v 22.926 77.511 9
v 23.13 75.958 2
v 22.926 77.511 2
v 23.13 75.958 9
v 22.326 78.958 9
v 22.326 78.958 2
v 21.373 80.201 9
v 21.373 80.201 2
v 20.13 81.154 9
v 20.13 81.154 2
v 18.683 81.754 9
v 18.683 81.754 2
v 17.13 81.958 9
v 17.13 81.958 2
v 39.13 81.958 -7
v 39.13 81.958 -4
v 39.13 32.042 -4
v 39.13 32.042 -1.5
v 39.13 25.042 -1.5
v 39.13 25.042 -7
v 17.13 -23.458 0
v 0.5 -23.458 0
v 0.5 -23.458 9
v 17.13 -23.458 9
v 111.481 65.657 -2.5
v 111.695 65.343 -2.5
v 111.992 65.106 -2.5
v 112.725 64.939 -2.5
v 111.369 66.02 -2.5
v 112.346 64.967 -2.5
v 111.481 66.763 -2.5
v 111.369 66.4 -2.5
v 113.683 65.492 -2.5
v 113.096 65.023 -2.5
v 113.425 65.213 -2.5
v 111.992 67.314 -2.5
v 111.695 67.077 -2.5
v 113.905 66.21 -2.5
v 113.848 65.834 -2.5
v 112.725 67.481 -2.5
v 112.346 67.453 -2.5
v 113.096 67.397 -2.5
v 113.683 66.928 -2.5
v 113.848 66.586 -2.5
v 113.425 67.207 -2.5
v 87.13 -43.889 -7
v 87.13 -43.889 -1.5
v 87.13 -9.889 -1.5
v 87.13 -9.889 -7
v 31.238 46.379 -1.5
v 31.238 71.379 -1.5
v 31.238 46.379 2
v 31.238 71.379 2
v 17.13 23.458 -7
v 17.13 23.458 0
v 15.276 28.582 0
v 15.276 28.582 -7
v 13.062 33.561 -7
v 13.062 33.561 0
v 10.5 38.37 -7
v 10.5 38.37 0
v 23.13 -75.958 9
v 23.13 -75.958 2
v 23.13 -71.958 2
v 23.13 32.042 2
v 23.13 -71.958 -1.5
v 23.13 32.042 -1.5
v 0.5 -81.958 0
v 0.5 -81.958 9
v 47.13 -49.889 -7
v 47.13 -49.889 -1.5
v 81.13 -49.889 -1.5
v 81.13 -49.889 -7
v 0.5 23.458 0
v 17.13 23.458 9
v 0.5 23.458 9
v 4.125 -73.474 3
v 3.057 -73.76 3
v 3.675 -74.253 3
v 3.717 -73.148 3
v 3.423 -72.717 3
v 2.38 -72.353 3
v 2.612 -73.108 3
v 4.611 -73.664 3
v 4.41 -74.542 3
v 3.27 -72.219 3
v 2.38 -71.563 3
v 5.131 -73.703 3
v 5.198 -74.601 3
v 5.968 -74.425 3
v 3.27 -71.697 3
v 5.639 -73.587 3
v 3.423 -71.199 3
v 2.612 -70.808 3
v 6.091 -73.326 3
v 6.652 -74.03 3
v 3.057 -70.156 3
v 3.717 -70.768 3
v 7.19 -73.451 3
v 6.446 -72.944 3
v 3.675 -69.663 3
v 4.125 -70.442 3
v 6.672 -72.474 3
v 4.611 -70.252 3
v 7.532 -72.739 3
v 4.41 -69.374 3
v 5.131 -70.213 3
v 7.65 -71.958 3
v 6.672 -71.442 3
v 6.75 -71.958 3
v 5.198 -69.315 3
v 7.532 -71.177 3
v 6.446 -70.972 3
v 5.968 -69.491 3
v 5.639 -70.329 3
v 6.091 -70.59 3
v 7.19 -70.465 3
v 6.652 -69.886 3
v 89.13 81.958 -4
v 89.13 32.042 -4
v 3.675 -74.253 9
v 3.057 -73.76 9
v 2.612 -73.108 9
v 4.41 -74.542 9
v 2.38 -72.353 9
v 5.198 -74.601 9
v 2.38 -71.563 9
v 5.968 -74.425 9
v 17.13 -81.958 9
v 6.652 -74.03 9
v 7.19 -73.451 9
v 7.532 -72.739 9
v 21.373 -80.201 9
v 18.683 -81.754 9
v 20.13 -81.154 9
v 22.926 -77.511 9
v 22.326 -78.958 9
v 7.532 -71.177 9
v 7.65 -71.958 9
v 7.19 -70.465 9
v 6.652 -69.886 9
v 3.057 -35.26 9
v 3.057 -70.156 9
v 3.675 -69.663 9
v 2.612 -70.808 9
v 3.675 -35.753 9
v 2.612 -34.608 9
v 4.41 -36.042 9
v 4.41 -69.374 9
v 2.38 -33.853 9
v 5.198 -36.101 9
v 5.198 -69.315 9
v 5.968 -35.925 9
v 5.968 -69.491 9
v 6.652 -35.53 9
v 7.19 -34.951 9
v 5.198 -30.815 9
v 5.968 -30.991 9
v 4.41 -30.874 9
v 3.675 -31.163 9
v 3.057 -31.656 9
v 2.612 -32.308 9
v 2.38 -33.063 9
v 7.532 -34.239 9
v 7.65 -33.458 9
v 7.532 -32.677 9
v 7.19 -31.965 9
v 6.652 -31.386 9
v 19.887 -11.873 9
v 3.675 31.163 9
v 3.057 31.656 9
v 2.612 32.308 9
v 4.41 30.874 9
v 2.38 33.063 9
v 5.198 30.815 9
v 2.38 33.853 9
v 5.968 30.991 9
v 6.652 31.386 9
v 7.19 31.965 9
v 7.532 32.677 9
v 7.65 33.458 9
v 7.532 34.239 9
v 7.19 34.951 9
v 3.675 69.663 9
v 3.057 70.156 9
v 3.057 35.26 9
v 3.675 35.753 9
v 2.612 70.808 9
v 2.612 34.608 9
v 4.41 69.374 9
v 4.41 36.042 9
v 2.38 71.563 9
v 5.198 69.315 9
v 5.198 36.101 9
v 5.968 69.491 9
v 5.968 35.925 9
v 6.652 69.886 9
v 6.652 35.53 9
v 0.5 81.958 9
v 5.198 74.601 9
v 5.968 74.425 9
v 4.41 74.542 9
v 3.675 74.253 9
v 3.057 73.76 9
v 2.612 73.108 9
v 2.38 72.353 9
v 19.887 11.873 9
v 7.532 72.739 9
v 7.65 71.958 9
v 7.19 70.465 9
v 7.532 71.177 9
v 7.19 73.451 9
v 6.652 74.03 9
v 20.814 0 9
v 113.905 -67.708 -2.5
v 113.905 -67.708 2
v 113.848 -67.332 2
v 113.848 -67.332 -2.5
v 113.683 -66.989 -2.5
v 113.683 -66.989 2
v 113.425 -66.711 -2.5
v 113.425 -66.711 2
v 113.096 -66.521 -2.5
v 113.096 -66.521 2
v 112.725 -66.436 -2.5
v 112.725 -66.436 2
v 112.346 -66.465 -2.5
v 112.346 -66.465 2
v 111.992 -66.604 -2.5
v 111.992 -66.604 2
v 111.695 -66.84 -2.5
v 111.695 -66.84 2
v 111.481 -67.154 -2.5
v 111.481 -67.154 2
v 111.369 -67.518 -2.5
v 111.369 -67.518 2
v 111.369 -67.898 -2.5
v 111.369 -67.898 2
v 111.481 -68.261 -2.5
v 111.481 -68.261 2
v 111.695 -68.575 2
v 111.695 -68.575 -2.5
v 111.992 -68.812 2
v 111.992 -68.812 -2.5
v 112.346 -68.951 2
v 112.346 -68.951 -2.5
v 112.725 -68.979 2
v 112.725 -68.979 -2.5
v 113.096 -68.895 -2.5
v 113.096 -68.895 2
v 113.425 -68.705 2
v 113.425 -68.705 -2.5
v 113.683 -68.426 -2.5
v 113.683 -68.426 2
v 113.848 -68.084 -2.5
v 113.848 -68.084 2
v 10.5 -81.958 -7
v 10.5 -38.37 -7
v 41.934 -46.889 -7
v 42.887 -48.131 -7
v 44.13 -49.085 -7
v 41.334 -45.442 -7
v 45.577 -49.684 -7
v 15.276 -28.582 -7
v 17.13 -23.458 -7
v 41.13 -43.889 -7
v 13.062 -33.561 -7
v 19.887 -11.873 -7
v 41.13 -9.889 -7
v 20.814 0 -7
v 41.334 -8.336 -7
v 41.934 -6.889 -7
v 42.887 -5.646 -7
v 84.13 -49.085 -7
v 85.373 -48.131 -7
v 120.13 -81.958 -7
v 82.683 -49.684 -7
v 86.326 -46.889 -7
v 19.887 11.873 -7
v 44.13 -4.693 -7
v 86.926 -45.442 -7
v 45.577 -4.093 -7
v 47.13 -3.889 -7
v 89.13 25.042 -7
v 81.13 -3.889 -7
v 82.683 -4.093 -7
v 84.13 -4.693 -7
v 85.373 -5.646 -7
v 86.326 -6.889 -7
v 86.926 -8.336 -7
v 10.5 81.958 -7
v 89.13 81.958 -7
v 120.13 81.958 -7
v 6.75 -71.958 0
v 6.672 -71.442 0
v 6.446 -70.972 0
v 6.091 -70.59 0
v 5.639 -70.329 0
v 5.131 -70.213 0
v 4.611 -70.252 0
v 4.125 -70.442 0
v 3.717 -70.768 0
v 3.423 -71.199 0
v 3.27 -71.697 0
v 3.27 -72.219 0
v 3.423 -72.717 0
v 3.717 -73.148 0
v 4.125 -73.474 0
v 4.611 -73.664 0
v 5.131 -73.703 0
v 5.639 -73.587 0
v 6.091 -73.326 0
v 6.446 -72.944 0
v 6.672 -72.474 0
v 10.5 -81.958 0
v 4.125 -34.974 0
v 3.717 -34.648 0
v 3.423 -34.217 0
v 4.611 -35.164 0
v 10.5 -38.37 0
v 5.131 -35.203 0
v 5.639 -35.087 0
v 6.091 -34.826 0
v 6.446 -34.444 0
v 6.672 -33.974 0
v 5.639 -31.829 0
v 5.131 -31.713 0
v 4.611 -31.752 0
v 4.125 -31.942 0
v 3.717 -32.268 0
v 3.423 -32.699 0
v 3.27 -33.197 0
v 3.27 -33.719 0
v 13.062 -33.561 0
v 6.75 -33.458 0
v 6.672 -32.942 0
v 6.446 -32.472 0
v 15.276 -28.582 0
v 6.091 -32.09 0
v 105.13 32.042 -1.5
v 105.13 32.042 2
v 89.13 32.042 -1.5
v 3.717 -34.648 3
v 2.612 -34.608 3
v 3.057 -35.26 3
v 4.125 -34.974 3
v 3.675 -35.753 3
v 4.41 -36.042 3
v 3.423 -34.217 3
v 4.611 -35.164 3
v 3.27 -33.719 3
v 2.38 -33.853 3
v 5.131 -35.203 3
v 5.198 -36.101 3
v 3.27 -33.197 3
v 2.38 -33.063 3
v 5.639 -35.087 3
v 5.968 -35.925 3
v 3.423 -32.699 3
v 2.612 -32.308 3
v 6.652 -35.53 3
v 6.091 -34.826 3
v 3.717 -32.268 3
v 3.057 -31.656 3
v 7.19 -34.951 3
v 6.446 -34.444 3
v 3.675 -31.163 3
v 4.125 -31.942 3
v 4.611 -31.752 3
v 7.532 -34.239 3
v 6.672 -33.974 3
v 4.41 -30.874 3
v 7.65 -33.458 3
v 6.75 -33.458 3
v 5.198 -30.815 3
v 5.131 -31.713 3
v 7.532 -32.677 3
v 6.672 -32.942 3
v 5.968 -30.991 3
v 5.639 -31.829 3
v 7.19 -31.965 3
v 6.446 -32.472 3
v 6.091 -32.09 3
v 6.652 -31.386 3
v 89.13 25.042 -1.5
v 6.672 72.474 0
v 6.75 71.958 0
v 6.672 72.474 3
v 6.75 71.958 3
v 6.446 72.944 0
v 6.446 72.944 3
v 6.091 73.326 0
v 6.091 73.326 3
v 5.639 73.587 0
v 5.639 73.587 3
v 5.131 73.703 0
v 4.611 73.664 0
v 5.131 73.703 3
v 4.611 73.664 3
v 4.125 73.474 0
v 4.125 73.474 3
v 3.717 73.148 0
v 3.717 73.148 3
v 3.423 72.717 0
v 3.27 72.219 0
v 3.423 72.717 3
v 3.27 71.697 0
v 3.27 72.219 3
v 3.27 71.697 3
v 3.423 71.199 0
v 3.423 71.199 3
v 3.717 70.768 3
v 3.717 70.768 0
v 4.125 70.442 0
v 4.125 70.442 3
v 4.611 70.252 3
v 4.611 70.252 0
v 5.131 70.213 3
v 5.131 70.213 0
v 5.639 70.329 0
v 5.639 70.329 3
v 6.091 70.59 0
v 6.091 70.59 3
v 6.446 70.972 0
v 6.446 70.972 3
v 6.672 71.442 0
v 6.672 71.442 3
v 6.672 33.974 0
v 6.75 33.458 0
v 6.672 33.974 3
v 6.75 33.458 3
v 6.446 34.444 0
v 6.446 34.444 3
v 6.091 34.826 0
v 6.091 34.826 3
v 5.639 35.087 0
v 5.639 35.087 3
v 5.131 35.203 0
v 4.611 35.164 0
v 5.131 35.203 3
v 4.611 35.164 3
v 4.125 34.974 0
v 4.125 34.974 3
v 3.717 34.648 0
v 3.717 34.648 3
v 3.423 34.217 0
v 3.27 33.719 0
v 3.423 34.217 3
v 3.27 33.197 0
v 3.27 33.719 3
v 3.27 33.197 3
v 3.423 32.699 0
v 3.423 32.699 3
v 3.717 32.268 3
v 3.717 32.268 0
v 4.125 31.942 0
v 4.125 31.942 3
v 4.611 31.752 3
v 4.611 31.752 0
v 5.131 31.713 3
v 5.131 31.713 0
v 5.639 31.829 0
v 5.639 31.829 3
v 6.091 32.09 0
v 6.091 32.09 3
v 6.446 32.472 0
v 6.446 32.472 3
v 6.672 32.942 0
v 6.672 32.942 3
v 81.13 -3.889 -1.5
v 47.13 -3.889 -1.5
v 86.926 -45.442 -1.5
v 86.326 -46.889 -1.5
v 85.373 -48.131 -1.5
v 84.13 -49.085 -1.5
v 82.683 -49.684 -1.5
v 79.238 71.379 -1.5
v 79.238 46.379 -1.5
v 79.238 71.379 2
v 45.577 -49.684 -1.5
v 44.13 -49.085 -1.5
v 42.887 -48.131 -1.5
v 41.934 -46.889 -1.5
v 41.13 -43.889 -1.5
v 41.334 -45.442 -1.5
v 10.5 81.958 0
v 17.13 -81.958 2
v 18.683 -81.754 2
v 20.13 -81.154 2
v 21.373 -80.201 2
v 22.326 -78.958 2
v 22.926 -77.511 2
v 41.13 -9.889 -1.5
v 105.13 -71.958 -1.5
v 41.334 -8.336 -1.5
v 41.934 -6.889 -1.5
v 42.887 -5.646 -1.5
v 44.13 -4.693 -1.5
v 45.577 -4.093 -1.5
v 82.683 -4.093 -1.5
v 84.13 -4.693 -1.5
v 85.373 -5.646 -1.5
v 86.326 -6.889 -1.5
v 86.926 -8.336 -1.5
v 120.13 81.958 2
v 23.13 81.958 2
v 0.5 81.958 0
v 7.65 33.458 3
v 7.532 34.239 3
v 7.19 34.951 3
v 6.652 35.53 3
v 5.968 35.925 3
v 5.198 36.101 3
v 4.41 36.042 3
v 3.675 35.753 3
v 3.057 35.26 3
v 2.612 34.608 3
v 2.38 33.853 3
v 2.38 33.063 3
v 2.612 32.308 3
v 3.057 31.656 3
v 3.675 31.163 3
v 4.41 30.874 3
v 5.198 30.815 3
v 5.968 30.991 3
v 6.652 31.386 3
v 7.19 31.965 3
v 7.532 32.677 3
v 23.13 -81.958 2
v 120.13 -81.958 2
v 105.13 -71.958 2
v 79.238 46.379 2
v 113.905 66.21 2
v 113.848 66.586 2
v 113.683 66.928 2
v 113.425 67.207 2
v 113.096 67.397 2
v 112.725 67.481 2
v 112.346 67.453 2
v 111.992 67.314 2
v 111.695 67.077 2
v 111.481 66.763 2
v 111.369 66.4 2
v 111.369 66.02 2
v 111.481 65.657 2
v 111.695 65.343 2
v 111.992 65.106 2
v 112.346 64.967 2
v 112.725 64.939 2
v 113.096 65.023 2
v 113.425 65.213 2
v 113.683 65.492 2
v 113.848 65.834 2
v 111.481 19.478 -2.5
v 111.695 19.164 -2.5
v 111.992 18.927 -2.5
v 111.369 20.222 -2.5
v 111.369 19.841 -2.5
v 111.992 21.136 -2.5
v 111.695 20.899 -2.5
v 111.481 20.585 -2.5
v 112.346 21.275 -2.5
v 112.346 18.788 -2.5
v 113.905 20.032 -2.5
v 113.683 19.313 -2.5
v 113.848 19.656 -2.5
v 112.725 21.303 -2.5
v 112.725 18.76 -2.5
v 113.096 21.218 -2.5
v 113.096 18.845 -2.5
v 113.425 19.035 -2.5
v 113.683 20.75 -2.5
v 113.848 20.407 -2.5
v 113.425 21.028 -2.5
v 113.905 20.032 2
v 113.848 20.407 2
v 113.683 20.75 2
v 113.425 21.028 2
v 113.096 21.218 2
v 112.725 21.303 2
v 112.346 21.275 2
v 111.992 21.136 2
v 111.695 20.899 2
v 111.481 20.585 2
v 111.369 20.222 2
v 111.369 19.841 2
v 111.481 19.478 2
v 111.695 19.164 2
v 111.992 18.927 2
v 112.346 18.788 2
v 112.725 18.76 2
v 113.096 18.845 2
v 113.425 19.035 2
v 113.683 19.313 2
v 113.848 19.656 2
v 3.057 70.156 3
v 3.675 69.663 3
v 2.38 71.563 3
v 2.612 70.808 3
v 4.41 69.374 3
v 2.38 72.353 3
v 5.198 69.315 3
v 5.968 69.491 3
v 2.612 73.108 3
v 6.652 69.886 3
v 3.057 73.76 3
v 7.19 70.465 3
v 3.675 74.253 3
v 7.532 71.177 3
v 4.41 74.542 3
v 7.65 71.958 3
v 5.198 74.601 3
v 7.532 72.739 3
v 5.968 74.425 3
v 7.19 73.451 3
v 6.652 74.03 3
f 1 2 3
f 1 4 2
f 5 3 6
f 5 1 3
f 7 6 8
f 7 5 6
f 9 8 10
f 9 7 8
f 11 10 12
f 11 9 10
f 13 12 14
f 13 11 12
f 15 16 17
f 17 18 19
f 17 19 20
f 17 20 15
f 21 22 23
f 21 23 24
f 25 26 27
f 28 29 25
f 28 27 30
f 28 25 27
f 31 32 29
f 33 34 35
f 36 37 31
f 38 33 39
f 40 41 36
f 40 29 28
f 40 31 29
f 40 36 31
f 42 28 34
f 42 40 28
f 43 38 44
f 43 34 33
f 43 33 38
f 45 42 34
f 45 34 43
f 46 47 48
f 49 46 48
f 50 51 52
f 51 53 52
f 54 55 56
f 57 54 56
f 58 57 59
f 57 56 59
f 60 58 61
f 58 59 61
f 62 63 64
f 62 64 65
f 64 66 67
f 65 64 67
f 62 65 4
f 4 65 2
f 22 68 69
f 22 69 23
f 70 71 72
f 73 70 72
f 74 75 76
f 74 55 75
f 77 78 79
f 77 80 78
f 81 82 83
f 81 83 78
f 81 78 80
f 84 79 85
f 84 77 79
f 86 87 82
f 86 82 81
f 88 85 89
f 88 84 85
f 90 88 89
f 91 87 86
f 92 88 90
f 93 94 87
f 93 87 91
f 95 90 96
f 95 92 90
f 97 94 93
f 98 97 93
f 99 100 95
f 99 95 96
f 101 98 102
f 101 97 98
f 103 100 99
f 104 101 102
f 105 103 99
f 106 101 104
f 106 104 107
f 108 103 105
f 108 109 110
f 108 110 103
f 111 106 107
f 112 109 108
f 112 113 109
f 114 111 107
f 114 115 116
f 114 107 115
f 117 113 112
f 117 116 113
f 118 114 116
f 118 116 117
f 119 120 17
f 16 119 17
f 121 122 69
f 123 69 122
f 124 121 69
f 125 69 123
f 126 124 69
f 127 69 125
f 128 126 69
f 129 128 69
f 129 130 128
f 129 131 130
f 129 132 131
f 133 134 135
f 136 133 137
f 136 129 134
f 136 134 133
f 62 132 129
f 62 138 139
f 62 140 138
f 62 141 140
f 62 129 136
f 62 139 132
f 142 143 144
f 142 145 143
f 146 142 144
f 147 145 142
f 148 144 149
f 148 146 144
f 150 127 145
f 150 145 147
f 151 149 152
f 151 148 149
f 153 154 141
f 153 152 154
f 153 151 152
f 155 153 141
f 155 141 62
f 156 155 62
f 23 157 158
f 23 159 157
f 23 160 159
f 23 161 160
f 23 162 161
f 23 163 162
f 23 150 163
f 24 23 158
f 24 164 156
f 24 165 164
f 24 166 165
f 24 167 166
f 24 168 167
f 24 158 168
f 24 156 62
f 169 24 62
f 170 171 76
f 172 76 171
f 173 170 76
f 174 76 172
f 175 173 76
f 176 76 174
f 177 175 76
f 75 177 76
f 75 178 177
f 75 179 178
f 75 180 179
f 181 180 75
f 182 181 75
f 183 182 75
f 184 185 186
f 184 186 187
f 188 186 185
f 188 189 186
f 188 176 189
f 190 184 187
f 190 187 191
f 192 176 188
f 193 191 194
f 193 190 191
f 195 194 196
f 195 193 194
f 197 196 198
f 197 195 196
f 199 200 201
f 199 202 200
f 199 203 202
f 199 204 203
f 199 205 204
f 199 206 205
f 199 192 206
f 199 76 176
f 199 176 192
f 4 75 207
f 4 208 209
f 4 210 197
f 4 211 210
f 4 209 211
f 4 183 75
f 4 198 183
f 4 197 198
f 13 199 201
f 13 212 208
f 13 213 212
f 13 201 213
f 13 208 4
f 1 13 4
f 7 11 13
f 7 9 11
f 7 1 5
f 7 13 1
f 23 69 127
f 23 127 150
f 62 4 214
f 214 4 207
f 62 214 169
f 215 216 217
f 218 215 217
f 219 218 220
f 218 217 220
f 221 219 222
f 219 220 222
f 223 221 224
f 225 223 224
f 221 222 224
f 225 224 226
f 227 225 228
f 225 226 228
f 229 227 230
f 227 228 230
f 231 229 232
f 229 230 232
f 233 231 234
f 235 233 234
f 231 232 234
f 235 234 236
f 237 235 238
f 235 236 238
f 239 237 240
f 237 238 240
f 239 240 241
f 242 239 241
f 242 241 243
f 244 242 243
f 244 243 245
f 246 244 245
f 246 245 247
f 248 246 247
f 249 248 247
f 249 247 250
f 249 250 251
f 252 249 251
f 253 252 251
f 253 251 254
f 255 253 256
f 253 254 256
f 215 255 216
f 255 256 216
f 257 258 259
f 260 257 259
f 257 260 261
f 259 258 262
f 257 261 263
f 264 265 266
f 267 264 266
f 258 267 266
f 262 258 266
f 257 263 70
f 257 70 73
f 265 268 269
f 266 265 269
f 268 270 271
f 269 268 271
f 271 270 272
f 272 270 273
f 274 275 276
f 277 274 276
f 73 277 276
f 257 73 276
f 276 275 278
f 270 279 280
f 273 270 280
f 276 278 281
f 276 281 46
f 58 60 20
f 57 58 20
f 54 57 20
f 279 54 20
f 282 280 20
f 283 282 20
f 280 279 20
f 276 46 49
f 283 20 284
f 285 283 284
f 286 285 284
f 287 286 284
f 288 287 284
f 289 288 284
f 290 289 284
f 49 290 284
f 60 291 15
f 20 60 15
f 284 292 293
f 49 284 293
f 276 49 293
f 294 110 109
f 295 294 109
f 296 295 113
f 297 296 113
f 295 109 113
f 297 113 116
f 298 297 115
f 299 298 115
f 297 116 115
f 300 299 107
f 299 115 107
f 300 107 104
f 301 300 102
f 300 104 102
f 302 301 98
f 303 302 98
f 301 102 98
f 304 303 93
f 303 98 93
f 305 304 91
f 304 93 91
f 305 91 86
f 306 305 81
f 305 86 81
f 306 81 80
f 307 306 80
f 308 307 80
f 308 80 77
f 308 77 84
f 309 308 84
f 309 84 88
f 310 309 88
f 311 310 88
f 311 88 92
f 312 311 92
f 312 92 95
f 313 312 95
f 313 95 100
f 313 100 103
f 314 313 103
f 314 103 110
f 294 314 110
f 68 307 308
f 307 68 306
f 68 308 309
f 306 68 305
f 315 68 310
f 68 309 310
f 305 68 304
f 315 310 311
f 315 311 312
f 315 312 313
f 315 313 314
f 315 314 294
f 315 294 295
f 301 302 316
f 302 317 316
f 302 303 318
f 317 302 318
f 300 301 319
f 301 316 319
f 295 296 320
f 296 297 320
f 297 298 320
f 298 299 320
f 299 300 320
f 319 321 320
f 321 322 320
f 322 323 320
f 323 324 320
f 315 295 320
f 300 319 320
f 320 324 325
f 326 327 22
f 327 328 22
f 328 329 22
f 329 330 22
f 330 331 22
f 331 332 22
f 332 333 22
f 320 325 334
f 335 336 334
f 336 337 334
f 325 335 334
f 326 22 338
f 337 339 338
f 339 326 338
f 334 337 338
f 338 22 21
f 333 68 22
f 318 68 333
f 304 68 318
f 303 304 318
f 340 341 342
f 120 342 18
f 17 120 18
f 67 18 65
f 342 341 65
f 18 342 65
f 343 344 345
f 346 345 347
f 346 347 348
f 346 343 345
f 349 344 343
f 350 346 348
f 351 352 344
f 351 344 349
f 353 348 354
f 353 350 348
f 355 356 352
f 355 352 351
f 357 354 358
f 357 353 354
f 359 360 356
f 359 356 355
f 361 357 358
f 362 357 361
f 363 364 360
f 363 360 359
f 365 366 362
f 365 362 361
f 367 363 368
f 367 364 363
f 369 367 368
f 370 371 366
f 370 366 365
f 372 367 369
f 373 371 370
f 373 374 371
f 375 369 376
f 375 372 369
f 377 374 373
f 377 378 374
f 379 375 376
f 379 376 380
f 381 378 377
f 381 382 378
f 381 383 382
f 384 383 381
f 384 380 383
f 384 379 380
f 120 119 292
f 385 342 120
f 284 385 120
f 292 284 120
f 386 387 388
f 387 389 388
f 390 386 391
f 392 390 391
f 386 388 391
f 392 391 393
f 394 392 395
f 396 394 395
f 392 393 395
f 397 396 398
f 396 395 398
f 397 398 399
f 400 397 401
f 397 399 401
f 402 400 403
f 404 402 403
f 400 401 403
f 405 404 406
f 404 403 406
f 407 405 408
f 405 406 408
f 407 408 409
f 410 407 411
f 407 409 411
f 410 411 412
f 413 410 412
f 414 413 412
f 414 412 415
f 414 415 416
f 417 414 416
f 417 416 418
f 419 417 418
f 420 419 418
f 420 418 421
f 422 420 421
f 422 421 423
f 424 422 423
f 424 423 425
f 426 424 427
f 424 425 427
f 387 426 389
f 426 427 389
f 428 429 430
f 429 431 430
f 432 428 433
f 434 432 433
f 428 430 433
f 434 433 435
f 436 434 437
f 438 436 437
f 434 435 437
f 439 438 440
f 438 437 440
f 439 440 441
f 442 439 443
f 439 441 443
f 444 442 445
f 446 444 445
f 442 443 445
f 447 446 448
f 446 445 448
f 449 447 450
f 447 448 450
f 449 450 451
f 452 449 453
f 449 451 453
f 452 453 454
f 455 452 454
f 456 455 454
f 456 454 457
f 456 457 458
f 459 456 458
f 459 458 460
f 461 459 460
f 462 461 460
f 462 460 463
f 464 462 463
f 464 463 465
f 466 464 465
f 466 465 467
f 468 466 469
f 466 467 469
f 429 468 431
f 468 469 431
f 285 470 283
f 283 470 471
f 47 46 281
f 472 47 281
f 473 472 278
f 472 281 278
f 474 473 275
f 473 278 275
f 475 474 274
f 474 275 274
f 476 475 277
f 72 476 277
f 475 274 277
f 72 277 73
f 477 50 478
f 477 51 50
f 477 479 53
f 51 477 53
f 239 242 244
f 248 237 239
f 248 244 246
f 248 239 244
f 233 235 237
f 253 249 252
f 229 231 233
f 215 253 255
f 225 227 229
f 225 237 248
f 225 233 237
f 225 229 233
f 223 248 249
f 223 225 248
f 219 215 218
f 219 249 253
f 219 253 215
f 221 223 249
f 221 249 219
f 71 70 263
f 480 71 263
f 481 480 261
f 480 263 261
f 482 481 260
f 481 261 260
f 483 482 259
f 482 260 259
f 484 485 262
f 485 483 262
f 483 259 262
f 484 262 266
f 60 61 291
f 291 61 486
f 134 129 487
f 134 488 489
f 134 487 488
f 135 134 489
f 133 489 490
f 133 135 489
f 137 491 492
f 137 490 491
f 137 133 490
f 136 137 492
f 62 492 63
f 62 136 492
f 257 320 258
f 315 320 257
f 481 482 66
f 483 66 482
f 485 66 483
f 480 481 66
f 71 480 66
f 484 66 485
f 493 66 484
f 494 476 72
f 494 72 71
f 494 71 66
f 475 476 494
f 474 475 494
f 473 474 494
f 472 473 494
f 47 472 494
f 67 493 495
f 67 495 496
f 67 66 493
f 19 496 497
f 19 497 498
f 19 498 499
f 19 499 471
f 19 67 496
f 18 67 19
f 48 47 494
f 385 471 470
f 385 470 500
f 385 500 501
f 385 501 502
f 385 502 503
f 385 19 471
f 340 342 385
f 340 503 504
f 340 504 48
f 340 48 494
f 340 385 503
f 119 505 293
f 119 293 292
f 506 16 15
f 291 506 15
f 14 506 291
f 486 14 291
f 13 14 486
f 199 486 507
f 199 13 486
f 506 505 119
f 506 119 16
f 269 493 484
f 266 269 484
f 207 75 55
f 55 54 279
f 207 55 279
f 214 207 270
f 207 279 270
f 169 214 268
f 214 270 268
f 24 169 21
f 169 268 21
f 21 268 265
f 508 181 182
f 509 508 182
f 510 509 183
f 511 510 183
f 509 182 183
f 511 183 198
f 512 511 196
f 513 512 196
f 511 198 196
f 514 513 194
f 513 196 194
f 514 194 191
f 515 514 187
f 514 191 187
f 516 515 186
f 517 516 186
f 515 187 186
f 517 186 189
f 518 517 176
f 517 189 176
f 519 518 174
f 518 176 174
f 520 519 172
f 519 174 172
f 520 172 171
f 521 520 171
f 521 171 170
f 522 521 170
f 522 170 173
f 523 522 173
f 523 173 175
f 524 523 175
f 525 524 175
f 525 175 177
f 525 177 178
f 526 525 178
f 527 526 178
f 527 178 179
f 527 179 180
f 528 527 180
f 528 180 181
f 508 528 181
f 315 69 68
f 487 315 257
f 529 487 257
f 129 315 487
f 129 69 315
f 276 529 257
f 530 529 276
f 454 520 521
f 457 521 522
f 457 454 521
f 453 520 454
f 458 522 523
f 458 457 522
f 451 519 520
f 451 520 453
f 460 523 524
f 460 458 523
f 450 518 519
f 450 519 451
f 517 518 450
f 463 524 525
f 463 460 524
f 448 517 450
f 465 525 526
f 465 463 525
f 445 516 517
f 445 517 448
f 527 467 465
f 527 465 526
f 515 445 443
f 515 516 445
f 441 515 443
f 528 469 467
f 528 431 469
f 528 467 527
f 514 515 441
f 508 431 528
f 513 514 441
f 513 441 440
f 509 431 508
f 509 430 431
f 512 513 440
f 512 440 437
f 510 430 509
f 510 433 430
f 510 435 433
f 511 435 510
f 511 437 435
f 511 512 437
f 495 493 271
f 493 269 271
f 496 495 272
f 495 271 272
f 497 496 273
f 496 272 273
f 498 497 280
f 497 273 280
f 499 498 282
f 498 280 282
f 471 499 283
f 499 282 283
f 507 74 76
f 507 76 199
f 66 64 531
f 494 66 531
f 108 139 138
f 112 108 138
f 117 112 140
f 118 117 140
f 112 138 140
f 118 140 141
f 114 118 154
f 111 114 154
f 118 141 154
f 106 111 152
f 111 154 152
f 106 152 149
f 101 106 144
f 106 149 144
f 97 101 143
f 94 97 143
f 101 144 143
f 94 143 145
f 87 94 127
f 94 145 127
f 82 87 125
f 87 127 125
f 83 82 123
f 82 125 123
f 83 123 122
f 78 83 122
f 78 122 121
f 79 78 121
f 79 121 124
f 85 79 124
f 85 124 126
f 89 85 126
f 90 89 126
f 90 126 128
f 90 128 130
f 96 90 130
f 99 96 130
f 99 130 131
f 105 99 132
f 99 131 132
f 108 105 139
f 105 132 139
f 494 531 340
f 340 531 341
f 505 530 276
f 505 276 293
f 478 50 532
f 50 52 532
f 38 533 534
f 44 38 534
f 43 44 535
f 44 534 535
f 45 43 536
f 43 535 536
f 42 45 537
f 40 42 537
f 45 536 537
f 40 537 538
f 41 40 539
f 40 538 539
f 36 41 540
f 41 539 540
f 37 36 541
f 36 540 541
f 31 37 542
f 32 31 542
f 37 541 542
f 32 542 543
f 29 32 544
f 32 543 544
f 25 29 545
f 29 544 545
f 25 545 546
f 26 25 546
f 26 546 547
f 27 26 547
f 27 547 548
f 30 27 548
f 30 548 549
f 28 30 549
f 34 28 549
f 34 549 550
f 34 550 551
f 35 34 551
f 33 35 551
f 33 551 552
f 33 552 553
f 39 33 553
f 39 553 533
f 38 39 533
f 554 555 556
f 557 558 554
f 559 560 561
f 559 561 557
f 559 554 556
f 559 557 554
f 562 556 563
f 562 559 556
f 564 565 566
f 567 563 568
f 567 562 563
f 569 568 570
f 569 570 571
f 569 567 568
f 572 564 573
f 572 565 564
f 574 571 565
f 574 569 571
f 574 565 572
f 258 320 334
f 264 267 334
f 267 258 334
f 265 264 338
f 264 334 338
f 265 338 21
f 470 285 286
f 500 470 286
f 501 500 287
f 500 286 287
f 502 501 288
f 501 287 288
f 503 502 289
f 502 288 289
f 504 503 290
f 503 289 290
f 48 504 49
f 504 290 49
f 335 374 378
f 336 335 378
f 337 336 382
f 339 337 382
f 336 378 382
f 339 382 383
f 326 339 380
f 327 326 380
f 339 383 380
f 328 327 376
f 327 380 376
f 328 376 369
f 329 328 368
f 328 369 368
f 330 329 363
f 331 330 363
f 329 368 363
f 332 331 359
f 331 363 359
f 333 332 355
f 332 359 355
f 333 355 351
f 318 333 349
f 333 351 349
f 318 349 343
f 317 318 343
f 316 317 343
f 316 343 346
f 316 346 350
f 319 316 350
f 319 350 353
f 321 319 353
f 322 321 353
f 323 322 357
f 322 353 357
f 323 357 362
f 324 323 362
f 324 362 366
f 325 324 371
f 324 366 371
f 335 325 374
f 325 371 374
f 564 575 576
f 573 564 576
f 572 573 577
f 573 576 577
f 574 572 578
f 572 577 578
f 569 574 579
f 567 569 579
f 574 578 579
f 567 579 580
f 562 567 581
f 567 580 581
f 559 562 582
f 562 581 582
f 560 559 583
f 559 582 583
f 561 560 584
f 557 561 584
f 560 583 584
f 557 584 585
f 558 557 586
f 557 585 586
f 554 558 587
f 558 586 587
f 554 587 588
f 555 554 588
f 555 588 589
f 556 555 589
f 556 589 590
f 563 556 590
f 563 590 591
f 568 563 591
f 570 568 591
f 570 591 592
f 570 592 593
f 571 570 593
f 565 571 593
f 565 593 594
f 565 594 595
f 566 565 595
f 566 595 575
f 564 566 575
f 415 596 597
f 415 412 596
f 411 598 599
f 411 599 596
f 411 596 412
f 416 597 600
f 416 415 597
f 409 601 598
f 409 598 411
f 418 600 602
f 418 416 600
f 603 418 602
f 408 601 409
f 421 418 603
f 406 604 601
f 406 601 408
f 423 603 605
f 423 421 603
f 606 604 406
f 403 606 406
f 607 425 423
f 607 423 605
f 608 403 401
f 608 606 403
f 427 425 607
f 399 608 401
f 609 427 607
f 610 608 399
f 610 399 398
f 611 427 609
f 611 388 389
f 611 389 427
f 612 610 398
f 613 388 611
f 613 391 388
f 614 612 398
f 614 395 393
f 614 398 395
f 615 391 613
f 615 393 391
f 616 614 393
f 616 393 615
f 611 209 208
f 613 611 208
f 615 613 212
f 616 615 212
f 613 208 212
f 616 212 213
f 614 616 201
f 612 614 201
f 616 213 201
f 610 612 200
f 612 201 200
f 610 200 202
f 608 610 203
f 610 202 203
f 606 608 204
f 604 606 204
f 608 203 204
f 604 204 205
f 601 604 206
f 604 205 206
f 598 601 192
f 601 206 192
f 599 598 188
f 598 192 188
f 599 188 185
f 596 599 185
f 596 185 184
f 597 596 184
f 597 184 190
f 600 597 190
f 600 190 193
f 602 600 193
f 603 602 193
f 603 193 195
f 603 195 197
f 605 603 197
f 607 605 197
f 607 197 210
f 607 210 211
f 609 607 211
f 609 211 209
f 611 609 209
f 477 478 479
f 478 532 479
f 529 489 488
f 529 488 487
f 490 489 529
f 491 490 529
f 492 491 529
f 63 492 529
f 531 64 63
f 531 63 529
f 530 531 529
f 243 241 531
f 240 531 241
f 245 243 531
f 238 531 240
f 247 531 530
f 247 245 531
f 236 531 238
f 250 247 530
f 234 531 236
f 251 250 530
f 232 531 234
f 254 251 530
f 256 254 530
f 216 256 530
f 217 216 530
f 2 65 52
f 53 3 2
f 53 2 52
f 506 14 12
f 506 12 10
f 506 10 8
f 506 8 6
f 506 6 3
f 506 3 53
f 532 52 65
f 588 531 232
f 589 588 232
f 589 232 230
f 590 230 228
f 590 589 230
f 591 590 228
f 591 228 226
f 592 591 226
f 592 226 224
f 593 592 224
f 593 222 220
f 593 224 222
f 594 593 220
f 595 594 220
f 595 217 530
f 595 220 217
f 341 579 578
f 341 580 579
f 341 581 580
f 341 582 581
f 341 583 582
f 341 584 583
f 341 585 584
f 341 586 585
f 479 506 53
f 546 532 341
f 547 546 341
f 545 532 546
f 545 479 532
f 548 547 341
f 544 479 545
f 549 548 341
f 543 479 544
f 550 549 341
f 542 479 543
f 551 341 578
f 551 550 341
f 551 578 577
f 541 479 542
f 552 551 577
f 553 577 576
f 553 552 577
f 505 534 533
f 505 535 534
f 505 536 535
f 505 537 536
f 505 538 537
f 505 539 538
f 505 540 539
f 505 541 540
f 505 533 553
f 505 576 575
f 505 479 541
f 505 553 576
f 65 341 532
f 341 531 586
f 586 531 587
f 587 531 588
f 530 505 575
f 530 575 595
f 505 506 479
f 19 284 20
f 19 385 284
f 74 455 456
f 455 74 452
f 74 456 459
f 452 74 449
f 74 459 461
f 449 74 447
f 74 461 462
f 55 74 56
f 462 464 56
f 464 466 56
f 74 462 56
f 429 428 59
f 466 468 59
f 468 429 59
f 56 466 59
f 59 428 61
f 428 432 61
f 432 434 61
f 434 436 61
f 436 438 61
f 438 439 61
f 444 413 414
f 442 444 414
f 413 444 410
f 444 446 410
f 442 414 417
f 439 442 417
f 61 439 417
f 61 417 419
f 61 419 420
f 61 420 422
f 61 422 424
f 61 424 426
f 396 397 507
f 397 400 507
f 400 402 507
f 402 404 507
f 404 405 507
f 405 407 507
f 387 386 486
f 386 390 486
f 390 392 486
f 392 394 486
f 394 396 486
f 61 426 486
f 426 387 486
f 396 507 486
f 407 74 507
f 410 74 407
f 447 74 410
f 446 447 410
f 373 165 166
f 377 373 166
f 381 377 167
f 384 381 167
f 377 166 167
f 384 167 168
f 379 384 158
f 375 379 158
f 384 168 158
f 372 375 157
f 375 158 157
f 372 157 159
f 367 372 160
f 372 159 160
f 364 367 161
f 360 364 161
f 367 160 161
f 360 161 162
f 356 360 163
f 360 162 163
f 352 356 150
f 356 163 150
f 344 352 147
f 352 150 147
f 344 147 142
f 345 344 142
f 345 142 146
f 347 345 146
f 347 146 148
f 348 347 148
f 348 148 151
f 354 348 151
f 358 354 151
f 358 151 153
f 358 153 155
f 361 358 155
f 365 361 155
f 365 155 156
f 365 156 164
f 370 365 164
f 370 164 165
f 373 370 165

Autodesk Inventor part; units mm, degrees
ref_plane "YZ Plane" through (0, 0, 0) normal (1, 0, 0) x (0, 1, 0)
ref_plane "XZ Plane" through (0, 0, 0) normal (0, 1, 0) x (-1, 0, 0)
ref_plane "XY Plane" through (0, 0, 0) normal (0, 0, 1) x (1, 0, 0)
sketch "Sketch1" plane through (0, 0, 0) normal (0, 0, 1) x (1, 0, 0)
  line L0 (0, 0) -> (0, 22.958) construction
  line L1 (0, 0) -> (0, -22.958) construction
  line L2 (0, -22.958) -> (16.63, -22.958) construction
  line L3 (16.63, -22.958) -> (16.63, -81.958) construction
  line L4 (16.63, -81.958) -> (0, -81.958) construction
  line L5 (0, -81.958) -> (0, -22.958) construction
  line L6 (0, 22.958) -> (16.63, 22.958) construction
  line L7 (16.63, 22.958) -> (16.63, 81.958) construction
  line L8 (16.63, 81.958) -> (0, 81.958) construction
  line L9 (0, 81.958) -> (0, 22.958) construction
  line L10 (0, -52.458) -> (0.5, -52.458) construction
  line L11 (8.315, -22.958) -> (8.315, -23.458) construction
  line L12 (0, 0) -> (-53.686, 0) construction
  circle A0 centre (-53.686, 0) radius 74 construction
  line L13 (20.314, 0) -> (20.814, 0) construction
  line L14 (16.63, -22.958) -> (17.13, -22.958) construction
  line L15 (16.63, 22.958) -> (17.13, 22.958) construction
  line L16 (0.5, -23.458) -> (17.13, -23.458)
  line L17 (17.13, -23.458) -> (17.13, -81.958)
  line L18 (17.13, -81.958) -> (0.5, -81.958)
  line L19 (0.5, -81.958) -> (0.5, -23.458)
  line L20 (8.315, 22.958) -> (8.315, 23.458) construction
  line L21 (0.5, 81.958) -> (17.13, 81.958)
  line L22 (17.13, 81.958) -> (17.13, 23.458)
  line L23 (17.13, 23.458) -> (0.5, 23.458)
  line L24 (0.5, 23.458) -> (0.5, 81.958)
  arc A1 (17.13, -23.458) -> (17.13, 23.458) centre (-55.7128, 0) ccw
  line L25 (17.13, -81.958) -> (23.13, -81.958)
  line L26 (23.13, -81.958) -> (23.13, 81.958)
  line L27 (23.13, 81.958) -> (17.13, 81.958)
  dimension "d8" = 148
  dimension "d0" = 22.958
  dimension "d1" = 22.958
  dimension "d2" = 16.63
  dimension "d3" = 59
  dimension "d5" = 0.5
  dimension "d6" = 0.5
  dimension "d7" = 53.686
  dimension "d9" = 0.5
  dimension "d10" = 0.5
  dimension "d11" = 0.5
  dimension "d13" = 0.5
  dimension "d14" = 6
extrude "Extrusion1" add sketch "Sketch1" along normal blind 9
sketch "Sketch2" plane through (0, 0, 0) normal (0, 0, -1) x (-1, 0, 0)
  line L0 (-16.63, 22.958) -> (-16.63, 81.958) construction
  circle A0 centre (53.686, 0) radius 74 construction
  line L1 (-16.63, -22.958) -> (-16.63, -81.958) construction
  line L2 (-0.5, 23.458) -> (-17.13, 23.458) projected
  line L3 (-16.63, 23.458) -> (-16.63, 81.958)
  line L4 (-23.13, 81.958) -> (-0.5, 81.958) projected
  line L5 (-17.13, -23.458) -> (-0.5, -23.458) projected
  line L6 (-16.63, -23.458) -> (-16.63, -81.958)
  line L7 (-0.5, -81.958) -> (-23.13, -81.958) projected
  arc A1 (-17.13, 23.458) -> (-17.13, -23.458) centre (55.7128, 0) ccw projected
  arc A2 (-17.13, 23.458) -> (-17.13, -23.458) centre (55.7128, 0) ccw
  line L8 (-23.13, 81.958) -> (-110.13, 81.958)
  line L9 (-110.13, 81.958) -> (-110.13, -81.958)
  line L10 (-110.13, -81.958) -> (-23.13, -81.958)
  line L11 (-23.13, -81.958) -> (-23.13, 81.958)
  line L12 (0, 0) -> (-10.5, 0) construction
  line L13 (-0.5, -81.958) -> (-23.13, -81.958) projected
  arc A3 (-10.5, 38.3695) -> (-10.5, -38.3695) centre (55.7128, 0) ccw
  line L14 (-10.5, 38.3695) -> (-10.5, 81.958)
  line L15 (-10.5, -38.3695) -> (-10.5, -81.958)
  point P0 (-10, 81.958)
  dimension "d17" = 87
  dimension "d66" = 10.5
extrude "Extrusion2" add sketch "Sketch2" along normal blind 7 and the other way blind 2 contours A1 A3 L6 L7 L11 L4 L3 | L3 L4 L14 A3 | A3 L15 L7 L6 | L11 L10 L9 L8
sketch "Sketch3" plane through (0, 0, 9) normal (0, 0, 1) x (1, 0, 0)
  line L0 (0.5, -81.958) -> (23.13, -81.958) construction
  line L1 (0, -23.458) -> (10, -23.458) construction
  line L2 (10, -23.458) -> (10, -81.958) construction
  line L3 (10, -81.958) -> (0, -81.958) construction
  line L4 (0, -81.958) -> (0, -23.458) construction
  line L5 (0, 23.458) -> (10, 23.458) construction
  line L6 (0, 81.958) -> (0, 23.458) construction
  line L7 (5, -81.958) -> (5, -71.958) construction
  line L8 (17.13, -23.458) -> (0.5, -23.458) construction
  line L9 (5, -23.458) -> (5, -33.458) construction
  line L10 (5, -23.458) -> (15, -23.458) construction
  circle A0 centre (5, -71.958) radius 1.75
  circle A1 centre (5, -33.458) radius 1.75
  line L11 (-21.548, 0) -> (41.2165, 0) construction
  circle A2 centre (5, 71.958) radius 1.75
  circle A3 centre (5, 33.458) radius 1.75
  point P0 (0, 0)
  dimension "d20" = 10
  dimension "d21" = 10
  dimension "d22" = 10
  dimension "d24" = 3.5
  dimension "d25" = 3.5
extrude "Extrusion3" cut sketch "Sketch3" against normal up to surface (9 mm away)
sketch "Sketch4" plane through (0, 0, 9) normal (0, 0, 1) x (1, 0, 0)
  circle A0 centre (5, -71.958) radius 1.75 projected
  circle A1 centre (5, -71.958) radius 2.65
  circle A2 centre (5, -33.458) radius 1.75 projected
  circle A3 centre (5, -33.458) radius 2.65
  circle A4 centre (5, 33.458) radius 1.75 projected
  circle A5 centre (5, 33.458) radius 2.65
  circle A6 centre (5, 71.958) radius 1.75 projected
  circle A7 centre (5, 71.958) radius 2.65
  point P0 (0, 0)
  dimension "d28" = 5.3
  dimension "d29" = 5.3
extrude "Extrusion4" cut sketch "Sketch4" against normal blind 6 contours A0 | A1 | A2 | A3 | A4 | A5 | A6 | A7
sketch "Sketch5" plane through (0, 0, 2) normal (0, 0, 1) x (1, 0, 0)
  line L0 (23.13, -71.958) -> (105.13, -71.958)
  line L1 (105.13, -71.958) -> (105.13, 32.042)
  line L2 (105.13, 32.042) -> (23.13, 32.042)
  line L3 (23.13, 32.042) -> (23.13, -71.958)
  line L4 (31.2383, 46.3792) -> (79.2383, 46.3792)
  line L5 (79.2383, 46.3792) -> (79.2383, 71.3792)
  line L6 (79.2383, 71.3792) -> (31.2383, 71.3792)
  line L7 (31.2383, 71.3792) -> (31.2383, 46.3792)
  line L8 (23.13, -81.958) -> (23.13, 81.958) construction
  line L9 (23.13, -81.958) -> (23.13, 81.958) construction
  line L10 (23.13, -81.958) -> (23.13, -71.958) construction
  point P0 (0, 0)
  dimension "d34" = 82
  dimension "d35" = 104
  dimension "d36" = 48
  dimension "d37" = 25
  dimension "d38" = 10
extrude "Extrusion5" cut sketch "Sketch5" against normal blind 3.5
sketch "Sketch6" plane through (0, 0, 2) normal (0, 0, 1) x (1, 0, 0)
  line L0 (23.13, 32.042) -> (105.13, 32.042) projected
  line L1 (64.13, 32.042) -> (39.13, 32.042)
  line L2 (64.13, 32.042) -> (89.13, 32.042)
  line L3 (89.13, 32.042) -> (89.13, 25.042)
  line L4 (89.13, 25.042) -> (39.13, 25.042)
  line L5 (39.13, 25.042) -> (39.13, 32.042)
  point P0 (0, 0)
  dimension "d41" = 25
  dimension "d42" = 25
  dimension "d43" = 7
extrude "Extrusion6" cut sketch "Sketch6" against normal up to surface (9 mm away)
sketch "Sketch7" plane through (23.13, 32.042, 2) normal (0, -1, 0) x (1, 0, 0)
  line L0 (66, -9) -> (16, -9) projected
  line L1 (66, -3.5) -> (66, -9) projected
  line L2 (16, -9) -> (66, -9)
  line L3 (66, -9) -> (66, -6)
  line L4 (66, -6) -> (16, -6)
  line L5 (16, -6) -> (16, -9)
  point P0 (-23.13, -2)
  dimension "d46" = 3
extrude "Extrusion7" cut sketch "Sketch7" against normal up to surface (49.916 mm away)
sketch "Sketch8" plane through (0, 0, -1.5) normal (0, 0, 1) x (1, 0, 0)
  line L0 (41.13, -49.8888) -> (87.13, -49.8888)
  line L1 (87.13, -49.8888) -> (87.13, -3.8888)
  line L2 (87.13, -3.8888) -> (41.13, -3.8888)
  line L3 (41.13, -3.8888) -> (41.13, -49.8888)
  line L4 (41.13, -49.8888) -> (87.13, -3.8888) construction
  line L5 (87.13, -49.8888) -> (41.13, -3.8888) construction
  point P0 (0, 0)
  point P1 (64.13, -26.8888)
  dimension "d49" = 46
  dimension "d50" = 46
extrude "Extrusion8" cut sketch "Sketch8" against normal up to surface (5.5 mm away)
sketch "Sketch9" plane through (0, 0, 2) normal (0, 0, 1) x (1, 0, 0)
  line L0 (110.13, 81.958) -> (110.13, -81.958) projected
  line L1 (110.13, -81.958) -> (120.13, -81.958)
  line L2 (120.13, -81.958) -> (120.13, 81.958)
  line L3 (120.13, 81.958) -> (110.13, 81.958)
  line L4 (110.13, 81.958) -> (110.13, -81.958)
  point P0 (0, 0)
  dimension "d53" = 10
extrude "Extrusion9" add sketch "Sketch9" against normal blind 9
sketch "Sketch10" plane through (0, 0, 2) normal (0, 0, 1) x (1, 0, 0)
  line L0 (105.13, 32.042) -> (105.13, -71.958) construction
  line L1 (105.13, -71.958) -> (120.13, -71.958) construction
  line L2 (120.13, -81.958) -> (120.13, 81.958) construction
  circle A0 centre (112.63, -67.7077) radius 1.275
  circle A1 centre (112.63, 66.21) radius 1.275
  circle A2 centre (112.63, 20.0315) radius 1.275
  line L3 (23.13, -81.958) -> (120.13, -81.958) construction
  line L4 (112.63, 66.21) -> (112.63, 81.958) construction
  line L5 (89.13, 81.958) -> (120.13, 81.958) construction
  line L6 (112.63, 66.21) -> (112.63, 20.0315) construction
  line L7 (112.63, -67.7077) -> (112.63, -81.958) construction
  point P0 (0, 0)
  dimension "d56" = 2.55
  dimension "d57" = 2.55
  dimension "d58" = 2.55
  dimension "d60" = 15.748
  dimension "d61" = 46.1785
  dimension "d62" = 14.2503
extrude "Extrusion10" cut sketch "Sketch10" against normal blind 4.5
fillet "Fillet1" radius 6 6 edges at (41.13, -49.8888, -4.25) (41.13, -3.8888, -4.25) (87.13, -3.8888, -4.25) (87.13, -49.8888, -4.25) (23.13, 81.958, 5.5) (23.13, -81.958, 5.5)
properties part number "Base Extension 1"
